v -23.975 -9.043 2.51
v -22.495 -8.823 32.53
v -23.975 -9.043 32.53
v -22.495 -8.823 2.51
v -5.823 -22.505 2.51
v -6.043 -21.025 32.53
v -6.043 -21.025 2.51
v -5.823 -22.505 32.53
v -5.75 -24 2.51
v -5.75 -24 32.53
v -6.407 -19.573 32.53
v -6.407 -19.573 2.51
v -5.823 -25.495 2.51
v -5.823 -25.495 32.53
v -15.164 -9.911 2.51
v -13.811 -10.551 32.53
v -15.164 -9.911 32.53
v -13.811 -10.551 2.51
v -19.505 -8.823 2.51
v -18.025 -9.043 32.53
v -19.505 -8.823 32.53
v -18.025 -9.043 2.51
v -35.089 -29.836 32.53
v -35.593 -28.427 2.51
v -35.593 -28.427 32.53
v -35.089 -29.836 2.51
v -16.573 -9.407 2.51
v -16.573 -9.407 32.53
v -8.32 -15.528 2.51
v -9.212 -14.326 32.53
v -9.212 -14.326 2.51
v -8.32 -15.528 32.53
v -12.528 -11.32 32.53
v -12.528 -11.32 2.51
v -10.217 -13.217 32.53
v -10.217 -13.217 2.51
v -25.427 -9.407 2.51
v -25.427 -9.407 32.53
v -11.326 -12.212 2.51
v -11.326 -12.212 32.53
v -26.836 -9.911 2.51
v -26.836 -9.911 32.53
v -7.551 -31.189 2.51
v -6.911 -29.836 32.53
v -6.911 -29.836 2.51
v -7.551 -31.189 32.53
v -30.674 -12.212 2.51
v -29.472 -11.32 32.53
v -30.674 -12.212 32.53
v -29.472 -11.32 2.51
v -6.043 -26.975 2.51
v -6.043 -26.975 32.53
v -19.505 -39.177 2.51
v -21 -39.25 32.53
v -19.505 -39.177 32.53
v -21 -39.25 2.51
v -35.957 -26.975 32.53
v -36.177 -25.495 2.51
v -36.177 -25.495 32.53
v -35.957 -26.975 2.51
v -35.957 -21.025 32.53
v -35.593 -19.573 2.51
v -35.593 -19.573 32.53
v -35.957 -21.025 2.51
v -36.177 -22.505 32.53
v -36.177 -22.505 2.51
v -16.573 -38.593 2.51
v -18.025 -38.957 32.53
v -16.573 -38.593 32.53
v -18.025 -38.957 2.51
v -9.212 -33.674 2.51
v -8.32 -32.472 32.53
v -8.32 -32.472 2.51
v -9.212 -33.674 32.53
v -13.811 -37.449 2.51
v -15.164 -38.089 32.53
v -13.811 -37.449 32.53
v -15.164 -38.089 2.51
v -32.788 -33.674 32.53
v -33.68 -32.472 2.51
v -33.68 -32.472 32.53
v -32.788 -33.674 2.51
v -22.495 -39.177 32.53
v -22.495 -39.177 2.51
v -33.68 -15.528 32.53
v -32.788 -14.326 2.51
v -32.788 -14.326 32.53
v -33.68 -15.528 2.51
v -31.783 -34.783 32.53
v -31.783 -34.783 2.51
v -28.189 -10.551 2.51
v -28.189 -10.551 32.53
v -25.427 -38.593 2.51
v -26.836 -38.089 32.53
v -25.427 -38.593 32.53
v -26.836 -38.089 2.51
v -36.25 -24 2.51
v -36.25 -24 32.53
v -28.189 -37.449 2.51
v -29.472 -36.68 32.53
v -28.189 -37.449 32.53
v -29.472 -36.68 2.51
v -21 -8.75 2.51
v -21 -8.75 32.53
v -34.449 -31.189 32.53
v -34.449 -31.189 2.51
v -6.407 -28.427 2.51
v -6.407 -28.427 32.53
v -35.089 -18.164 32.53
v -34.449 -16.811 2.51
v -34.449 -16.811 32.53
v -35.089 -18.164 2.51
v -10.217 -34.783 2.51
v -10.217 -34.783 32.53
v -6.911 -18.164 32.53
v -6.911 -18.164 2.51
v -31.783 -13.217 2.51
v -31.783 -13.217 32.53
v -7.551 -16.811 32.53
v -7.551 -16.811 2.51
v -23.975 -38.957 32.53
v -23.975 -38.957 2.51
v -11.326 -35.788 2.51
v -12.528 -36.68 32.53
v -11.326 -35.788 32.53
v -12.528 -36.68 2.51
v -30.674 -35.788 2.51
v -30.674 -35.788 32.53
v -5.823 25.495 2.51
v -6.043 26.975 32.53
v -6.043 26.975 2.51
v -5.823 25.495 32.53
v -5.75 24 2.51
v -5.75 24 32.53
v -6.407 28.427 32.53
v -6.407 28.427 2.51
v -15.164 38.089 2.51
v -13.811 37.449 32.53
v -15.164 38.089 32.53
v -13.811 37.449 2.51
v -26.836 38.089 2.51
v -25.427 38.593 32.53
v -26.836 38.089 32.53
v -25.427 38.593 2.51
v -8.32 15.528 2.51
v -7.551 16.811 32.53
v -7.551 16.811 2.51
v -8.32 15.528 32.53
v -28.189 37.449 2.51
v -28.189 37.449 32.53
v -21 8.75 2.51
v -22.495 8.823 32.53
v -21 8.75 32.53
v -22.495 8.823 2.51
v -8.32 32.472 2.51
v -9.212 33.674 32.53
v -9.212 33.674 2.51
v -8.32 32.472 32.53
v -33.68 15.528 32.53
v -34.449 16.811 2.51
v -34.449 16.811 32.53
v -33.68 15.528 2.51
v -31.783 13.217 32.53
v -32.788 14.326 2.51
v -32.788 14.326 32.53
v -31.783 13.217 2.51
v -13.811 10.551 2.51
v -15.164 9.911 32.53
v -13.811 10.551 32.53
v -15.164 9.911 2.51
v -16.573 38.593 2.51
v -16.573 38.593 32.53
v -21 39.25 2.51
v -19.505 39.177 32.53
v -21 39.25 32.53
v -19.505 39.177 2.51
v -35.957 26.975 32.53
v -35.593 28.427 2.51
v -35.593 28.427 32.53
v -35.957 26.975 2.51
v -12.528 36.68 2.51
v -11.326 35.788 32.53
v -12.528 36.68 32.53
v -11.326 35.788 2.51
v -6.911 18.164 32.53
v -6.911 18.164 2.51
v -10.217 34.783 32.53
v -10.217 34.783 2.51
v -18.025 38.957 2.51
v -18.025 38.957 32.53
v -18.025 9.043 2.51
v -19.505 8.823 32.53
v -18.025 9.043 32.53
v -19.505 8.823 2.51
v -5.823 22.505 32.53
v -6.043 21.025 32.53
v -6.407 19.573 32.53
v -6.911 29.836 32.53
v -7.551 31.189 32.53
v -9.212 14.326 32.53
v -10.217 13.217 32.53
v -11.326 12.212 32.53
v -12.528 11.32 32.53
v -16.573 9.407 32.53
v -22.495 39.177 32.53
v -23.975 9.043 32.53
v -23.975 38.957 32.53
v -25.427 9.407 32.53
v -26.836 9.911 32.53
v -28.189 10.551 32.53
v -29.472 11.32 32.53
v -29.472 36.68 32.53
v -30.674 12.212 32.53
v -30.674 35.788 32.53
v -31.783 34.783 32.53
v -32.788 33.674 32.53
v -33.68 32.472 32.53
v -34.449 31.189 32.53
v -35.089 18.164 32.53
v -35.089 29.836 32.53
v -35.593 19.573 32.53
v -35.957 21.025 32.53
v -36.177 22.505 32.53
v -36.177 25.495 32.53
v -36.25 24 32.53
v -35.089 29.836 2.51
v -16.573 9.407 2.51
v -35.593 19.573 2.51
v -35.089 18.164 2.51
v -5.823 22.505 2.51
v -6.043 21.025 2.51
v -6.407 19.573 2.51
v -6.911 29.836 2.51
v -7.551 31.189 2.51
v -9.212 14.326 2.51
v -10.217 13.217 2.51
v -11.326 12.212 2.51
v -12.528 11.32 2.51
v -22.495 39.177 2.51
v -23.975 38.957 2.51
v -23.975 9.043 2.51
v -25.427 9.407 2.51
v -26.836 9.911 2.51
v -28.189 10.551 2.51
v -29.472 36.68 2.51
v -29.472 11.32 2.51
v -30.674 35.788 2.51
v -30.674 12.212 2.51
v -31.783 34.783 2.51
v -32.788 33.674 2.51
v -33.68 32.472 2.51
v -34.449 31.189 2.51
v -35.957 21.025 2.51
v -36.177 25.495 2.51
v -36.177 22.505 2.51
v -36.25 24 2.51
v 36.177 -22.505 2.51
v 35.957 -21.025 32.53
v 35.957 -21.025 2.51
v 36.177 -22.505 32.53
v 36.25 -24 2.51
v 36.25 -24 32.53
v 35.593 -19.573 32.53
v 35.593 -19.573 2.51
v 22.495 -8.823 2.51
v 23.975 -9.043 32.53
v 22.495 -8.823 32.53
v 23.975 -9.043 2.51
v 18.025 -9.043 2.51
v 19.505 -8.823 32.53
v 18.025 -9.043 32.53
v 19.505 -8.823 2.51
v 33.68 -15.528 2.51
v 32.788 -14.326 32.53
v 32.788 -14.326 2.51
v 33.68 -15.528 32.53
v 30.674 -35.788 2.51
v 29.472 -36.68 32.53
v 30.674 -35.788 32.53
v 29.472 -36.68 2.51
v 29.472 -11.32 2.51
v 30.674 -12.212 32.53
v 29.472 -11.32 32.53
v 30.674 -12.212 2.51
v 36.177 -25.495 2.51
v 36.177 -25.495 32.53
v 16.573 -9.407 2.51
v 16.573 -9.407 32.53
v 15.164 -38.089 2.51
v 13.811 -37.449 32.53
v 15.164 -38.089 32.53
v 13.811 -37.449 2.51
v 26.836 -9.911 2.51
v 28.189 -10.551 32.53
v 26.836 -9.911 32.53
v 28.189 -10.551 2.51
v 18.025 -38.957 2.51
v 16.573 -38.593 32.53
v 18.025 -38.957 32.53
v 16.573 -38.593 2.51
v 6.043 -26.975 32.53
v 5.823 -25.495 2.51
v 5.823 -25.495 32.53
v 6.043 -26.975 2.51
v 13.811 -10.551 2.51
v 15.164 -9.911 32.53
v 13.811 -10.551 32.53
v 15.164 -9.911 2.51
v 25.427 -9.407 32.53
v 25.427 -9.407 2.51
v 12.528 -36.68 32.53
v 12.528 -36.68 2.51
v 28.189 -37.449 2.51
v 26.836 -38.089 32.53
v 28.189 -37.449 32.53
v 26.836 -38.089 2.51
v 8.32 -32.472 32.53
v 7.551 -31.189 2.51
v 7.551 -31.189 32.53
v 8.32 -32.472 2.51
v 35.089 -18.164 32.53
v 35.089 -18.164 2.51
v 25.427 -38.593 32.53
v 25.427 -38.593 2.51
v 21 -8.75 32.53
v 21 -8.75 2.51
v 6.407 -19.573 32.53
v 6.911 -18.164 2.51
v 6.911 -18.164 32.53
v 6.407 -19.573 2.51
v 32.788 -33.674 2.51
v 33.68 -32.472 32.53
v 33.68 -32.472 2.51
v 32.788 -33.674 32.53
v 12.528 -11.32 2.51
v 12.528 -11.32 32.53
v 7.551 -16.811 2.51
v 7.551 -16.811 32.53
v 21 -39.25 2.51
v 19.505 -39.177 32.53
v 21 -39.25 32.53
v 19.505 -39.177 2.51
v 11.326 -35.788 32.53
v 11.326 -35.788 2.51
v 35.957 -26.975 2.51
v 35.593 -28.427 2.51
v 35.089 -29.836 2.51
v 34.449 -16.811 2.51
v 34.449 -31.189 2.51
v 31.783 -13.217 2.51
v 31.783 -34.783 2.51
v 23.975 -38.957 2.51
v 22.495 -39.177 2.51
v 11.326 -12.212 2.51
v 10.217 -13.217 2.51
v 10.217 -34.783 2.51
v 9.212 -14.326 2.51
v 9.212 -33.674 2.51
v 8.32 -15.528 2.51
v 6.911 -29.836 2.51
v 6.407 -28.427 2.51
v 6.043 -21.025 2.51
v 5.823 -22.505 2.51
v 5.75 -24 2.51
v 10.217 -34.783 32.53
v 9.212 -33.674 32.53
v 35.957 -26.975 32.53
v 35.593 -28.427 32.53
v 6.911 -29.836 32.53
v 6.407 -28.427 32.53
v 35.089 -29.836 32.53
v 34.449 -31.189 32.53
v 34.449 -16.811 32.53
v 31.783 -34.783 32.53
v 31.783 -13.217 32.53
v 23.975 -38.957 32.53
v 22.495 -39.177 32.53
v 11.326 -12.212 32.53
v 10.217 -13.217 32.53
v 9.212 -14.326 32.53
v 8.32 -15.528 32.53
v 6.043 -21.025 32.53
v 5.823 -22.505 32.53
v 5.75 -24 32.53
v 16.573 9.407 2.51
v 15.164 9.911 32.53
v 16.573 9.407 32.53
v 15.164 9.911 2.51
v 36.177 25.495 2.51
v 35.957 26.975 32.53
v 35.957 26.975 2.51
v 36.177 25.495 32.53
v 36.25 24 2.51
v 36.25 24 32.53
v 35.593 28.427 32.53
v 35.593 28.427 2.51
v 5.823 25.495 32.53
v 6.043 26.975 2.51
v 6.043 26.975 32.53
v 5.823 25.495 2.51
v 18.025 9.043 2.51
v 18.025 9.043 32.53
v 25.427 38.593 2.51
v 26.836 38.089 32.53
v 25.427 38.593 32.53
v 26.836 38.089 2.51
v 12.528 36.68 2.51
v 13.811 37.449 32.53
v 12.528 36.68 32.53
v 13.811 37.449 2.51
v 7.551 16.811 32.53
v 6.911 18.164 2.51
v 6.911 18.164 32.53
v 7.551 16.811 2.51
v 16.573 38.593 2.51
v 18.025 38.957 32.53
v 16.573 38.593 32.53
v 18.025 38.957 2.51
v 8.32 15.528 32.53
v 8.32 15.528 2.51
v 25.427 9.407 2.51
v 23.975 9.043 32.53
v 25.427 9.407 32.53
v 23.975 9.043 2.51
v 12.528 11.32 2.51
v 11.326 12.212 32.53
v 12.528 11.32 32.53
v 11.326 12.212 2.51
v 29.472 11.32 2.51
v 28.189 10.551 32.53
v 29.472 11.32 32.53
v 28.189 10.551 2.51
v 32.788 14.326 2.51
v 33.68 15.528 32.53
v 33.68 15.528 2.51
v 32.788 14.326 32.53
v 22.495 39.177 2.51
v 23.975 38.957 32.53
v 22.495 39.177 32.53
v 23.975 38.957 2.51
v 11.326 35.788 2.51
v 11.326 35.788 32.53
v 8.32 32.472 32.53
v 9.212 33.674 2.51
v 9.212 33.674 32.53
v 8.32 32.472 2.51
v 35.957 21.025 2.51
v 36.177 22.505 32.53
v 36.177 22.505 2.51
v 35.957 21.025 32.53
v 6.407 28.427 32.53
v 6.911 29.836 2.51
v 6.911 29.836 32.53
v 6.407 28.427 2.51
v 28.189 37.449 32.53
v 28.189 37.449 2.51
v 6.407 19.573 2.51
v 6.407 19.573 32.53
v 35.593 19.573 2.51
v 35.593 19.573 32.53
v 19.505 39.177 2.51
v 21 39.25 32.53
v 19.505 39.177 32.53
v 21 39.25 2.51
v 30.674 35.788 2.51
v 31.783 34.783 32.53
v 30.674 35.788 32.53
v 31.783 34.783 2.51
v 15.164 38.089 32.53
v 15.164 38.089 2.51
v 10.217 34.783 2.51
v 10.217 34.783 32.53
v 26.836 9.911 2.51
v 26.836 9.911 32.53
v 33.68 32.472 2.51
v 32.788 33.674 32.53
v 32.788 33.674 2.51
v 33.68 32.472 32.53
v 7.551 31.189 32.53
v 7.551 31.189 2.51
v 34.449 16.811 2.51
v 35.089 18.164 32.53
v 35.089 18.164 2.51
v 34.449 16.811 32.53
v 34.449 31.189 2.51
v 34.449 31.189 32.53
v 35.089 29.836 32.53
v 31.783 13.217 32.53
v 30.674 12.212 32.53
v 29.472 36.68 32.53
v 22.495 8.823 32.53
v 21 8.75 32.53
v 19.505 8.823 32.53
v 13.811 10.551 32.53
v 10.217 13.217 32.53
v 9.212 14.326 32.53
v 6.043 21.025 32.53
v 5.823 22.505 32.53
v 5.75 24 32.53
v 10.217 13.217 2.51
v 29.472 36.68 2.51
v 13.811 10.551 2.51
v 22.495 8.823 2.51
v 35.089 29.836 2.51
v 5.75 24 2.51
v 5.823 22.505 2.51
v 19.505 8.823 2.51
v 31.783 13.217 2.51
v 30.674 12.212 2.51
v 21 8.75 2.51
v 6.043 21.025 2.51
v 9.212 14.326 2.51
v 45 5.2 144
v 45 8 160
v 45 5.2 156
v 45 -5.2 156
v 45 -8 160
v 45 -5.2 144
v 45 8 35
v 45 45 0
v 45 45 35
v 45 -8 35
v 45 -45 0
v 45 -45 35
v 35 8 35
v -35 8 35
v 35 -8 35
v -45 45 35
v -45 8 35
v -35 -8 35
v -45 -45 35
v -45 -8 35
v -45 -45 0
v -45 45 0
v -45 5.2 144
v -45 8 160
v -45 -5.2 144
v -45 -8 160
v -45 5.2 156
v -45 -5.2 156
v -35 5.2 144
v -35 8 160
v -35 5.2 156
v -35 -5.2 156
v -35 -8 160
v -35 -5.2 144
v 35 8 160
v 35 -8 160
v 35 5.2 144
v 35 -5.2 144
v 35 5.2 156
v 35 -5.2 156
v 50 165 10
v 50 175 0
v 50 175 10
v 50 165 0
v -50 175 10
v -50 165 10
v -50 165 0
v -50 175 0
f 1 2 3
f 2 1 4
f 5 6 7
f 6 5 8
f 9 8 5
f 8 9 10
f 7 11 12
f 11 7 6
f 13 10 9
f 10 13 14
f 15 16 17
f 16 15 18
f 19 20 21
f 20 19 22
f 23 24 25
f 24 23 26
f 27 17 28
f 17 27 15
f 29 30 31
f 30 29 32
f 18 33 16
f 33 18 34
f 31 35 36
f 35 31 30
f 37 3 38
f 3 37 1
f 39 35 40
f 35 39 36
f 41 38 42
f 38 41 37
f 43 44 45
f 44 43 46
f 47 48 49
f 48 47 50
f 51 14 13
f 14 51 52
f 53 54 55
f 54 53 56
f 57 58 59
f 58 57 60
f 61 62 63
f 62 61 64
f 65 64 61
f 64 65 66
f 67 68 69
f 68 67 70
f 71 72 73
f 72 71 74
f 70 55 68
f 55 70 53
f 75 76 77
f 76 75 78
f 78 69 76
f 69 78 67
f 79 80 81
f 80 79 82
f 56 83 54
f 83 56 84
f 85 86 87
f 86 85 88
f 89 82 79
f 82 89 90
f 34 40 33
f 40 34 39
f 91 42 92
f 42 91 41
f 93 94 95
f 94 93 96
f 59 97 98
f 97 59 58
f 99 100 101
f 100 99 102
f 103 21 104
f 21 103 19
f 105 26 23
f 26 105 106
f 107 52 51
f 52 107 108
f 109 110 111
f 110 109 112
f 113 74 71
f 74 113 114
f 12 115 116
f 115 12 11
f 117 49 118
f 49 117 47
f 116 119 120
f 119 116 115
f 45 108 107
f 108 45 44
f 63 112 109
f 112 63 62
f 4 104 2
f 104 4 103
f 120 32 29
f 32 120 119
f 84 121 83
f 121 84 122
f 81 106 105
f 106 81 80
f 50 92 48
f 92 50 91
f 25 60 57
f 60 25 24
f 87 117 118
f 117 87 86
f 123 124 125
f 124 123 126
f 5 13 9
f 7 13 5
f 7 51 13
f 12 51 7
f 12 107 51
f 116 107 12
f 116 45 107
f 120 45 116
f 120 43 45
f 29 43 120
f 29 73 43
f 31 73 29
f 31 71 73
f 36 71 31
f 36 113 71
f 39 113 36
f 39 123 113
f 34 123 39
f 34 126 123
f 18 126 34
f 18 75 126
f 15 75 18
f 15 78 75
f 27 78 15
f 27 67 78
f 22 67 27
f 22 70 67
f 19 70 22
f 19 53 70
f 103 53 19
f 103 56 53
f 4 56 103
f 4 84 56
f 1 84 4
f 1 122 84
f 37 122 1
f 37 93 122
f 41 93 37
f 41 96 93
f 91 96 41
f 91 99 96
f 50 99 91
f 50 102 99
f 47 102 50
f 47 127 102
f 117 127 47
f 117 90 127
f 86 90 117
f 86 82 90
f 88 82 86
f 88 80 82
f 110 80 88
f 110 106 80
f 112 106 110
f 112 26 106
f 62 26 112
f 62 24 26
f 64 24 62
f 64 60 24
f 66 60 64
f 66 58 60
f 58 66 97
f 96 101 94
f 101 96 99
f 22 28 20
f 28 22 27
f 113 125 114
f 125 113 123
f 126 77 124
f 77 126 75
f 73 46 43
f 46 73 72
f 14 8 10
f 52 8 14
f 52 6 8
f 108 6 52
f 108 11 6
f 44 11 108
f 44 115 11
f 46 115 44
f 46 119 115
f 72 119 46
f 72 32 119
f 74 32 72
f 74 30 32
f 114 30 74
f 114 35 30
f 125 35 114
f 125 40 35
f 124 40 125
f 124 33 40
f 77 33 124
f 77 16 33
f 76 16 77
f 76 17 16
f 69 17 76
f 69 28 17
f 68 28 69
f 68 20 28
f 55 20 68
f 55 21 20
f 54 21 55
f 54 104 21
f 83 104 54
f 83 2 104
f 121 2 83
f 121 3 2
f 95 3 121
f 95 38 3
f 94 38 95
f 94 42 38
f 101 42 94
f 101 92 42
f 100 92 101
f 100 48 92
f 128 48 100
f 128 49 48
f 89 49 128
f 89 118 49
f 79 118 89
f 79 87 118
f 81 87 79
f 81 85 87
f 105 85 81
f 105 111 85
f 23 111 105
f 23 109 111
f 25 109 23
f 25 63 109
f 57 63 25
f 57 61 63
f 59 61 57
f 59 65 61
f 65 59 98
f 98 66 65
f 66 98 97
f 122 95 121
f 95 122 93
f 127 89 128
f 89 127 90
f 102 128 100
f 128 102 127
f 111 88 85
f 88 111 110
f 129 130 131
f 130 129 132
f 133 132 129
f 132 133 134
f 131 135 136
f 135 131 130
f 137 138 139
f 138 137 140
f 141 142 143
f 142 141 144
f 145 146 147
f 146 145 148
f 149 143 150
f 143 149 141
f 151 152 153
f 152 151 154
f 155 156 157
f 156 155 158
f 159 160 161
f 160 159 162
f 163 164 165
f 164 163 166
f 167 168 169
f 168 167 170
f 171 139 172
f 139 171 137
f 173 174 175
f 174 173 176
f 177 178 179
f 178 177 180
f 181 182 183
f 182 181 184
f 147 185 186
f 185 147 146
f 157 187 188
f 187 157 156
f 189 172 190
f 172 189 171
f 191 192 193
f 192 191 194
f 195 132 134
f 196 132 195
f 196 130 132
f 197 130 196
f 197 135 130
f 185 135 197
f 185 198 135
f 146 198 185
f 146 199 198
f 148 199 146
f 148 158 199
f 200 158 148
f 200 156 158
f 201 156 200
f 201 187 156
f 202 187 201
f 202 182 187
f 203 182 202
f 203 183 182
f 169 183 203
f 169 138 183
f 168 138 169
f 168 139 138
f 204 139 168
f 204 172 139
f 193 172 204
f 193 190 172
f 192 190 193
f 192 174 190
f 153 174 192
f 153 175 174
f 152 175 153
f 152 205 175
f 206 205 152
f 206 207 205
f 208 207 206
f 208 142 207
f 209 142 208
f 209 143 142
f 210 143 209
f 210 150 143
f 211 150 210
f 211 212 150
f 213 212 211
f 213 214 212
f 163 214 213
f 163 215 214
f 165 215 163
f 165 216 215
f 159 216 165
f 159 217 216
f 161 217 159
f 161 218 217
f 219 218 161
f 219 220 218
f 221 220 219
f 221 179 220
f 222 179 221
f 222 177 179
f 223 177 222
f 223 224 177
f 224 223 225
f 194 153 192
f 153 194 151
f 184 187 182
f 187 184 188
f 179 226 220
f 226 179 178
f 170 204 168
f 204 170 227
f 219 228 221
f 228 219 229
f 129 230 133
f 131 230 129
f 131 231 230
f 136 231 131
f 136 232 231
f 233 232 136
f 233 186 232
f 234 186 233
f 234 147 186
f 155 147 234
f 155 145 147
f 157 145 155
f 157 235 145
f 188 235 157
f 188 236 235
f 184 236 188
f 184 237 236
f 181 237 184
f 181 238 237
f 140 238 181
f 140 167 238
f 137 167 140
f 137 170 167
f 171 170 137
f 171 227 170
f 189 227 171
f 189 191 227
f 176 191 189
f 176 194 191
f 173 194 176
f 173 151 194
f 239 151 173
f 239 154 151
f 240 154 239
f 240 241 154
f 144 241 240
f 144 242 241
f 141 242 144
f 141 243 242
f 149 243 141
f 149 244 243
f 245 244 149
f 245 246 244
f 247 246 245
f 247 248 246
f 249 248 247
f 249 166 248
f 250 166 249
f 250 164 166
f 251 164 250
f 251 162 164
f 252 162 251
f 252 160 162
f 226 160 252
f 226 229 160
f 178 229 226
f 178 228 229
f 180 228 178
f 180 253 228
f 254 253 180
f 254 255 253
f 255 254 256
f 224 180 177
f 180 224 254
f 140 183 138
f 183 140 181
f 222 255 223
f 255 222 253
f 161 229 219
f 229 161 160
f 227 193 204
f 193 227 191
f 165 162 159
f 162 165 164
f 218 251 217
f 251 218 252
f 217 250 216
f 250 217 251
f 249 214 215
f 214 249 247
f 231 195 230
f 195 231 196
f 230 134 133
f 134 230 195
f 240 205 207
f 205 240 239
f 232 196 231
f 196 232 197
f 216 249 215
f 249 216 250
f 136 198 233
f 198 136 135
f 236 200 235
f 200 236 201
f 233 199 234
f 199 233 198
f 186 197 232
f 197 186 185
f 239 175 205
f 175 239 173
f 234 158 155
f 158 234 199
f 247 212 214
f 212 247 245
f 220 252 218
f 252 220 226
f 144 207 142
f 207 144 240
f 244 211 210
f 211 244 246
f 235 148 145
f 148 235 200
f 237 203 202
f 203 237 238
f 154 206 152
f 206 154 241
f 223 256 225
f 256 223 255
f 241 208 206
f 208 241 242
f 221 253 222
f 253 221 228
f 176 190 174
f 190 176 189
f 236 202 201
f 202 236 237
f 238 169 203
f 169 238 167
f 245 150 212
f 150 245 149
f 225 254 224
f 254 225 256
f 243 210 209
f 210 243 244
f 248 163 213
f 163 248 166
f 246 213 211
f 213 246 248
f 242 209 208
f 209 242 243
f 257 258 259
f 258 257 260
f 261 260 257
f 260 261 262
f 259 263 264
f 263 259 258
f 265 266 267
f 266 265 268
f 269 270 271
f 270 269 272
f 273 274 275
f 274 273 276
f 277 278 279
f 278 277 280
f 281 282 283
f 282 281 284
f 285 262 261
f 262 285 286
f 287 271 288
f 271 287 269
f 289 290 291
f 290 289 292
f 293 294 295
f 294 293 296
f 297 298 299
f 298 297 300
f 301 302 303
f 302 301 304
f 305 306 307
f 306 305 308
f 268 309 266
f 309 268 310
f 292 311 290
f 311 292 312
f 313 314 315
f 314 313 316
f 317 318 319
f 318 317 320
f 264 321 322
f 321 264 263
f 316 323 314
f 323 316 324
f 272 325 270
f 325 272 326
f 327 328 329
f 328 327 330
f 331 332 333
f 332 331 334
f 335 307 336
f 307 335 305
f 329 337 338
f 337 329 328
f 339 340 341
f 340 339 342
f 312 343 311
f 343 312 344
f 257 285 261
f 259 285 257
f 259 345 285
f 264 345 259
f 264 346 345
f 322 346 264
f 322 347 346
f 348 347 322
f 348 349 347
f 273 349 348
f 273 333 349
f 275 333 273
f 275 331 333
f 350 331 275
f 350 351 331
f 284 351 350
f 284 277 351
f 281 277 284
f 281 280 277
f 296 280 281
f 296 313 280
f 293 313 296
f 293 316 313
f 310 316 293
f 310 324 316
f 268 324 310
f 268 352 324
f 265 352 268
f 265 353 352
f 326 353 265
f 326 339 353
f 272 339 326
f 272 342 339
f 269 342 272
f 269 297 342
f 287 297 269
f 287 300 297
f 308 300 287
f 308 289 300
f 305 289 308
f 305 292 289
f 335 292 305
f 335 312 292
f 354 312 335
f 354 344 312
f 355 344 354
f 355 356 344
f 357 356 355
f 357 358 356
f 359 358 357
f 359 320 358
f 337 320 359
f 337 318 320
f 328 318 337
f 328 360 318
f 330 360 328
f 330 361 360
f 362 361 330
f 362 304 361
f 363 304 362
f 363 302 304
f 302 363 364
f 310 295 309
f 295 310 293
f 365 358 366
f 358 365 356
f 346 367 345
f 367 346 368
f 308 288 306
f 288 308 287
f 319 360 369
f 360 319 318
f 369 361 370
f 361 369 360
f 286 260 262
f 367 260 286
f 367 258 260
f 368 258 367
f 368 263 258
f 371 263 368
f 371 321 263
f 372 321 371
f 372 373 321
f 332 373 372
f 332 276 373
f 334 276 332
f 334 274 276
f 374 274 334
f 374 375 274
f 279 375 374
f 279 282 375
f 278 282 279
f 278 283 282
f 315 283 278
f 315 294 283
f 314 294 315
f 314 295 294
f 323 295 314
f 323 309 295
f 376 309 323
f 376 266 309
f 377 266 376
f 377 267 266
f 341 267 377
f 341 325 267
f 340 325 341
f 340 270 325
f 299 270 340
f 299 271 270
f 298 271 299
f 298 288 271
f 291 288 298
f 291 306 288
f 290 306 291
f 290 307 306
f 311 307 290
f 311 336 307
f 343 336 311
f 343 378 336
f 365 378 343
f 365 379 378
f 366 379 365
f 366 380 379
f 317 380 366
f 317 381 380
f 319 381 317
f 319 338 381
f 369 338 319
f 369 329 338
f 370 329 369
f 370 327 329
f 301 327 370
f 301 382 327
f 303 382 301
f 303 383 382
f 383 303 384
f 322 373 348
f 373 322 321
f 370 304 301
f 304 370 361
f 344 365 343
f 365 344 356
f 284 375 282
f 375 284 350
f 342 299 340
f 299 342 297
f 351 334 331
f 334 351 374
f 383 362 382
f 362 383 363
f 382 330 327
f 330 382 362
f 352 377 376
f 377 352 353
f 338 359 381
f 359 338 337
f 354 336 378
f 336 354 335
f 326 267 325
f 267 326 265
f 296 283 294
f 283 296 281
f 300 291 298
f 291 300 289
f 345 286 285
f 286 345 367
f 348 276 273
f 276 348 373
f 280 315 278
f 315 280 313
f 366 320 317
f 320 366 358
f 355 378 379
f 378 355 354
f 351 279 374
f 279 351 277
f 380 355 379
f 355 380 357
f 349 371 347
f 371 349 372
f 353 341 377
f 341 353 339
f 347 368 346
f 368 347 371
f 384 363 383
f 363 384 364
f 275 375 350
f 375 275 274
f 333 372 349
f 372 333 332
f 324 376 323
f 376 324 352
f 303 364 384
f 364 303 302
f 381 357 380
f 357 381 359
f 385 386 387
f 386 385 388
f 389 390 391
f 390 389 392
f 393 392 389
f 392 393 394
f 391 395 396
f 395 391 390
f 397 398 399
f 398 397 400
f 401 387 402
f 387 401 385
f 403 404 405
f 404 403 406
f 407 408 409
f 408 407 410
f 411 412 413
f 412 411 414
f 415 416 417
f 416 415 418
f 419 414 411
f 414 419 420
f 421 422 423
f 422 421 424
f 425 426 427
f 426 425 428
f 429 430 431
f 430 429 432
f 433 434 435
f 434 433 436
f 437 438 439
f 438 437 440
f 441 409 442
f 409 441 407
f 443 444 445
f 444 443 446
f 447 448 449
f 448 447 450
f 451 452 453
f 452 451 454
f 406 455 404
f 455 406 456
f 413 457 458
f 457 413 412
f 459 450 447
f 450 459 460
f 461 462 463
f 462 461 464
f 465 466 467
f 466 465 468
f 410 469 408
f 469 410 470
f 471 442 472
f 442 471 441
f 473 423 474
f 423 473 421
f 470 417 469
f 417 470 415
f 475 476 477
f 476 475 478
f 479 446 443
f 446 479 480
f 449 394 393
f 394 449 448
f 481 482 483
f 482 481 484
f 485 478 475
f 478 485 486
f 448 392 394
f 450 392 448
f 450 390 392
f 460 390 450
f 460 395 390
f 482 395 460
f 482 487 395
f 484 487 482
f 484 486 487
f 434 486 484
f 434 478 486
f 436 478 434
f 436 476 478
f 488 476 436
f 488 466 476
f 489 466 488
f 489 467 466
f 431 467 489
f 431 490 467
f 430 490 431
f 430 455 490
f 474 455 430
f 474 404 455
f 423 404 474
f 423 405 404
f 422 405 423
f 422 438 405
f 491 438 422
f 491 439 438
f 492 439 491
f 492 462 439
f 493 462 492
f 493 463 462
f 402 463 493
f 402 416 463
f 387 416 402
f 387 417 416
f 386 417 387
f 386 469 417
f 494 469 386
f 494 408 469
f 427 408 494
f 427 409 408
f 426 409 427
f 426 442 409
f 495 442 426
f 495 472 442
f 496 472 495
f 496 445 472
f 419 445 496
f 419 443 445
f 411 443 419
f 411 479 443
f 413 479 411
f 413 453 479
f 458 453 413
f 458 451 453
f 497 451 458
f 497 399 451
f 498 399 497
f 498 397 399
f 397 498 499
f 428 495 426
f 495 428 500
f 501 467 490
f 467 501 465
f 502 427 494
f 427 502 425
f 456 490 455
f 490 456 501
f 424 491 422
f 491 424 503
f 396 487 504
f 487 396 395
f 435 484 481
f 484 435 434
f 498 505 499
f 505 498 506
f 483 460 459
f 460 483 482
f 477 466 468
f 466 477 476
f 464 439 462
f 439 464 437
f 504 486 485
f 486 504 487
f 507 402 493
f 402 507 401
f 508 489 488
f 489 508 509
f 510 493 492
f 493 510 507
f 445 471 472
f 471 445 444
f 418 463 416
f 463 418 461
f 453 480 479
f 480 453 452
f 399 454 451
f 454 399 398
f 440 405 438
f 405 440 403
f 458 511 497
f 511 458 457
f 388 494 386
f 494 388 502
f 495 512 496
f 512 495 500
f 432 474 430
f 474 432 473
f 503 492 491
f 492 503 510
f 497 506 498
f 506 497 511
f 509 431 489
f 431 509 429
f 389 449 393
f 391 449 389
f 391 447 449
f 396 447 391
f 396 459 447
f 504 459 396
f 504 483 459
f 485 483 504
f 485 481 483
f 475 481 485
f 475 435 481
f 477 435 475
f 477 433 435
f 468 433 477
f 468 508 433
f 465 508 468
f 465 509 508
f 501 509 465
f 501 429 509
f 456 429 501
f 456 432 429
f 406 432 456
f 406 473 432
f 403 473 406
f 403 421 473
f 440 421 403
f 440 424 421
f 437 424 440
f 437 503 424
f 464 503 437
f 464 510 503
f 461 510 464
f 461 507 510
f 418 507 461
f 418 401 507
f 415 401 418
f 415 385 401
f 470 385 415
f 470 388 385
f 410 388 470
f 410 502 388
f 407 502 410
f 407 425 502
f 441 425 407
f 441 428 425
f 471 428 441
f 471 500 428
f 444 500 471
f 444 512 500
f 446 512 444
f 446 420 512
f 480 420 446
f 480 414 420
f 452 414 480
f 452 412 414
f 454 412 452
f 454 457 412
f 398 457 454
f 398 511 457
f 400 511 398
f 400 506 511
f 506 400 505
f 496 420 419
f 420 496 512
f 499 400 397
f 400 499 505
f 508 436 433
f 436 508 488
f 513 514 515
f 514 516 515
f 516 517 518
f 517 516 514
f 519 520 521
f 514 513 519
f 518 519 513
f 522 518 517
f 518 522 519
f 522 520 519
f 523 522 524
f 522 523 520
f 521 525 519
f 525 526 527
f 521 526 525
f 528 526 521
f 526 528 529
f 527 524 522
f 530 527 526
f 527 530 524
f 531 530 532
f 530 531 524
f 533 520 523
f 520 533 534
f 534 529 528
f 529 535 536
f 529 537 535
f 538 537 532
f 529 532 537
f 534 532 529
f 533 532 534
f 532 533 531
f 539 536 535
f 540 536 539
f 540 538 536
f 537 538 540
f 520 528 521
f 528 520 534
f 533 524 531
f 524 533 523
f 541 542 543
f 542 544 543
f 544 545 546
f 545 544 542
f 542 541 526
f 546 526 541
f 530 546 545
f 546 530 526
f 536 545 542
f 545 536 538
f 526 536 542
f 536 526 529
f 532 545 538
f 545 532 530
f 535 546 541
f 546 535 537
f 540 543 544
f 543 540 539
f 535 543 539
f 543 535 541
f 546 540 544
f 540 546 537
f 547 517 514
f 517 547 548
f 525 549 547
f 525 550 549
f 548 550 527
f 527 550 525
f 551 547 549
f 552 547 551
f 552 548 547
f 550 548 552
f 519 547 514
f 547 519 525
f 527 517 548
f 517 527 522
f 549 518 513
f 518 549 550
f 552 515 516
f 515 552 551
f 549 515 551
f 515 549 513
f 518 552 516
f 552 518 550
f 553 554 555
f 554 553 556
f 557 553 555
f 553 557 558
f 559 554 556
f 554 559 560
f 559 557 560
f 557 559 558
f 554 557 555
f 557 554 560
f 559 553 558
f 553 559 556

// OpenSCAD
// --- Dimensions ---
// Part 1: Base Block
base_width = 90;          // X dimension of base
base_depth = 90;          // Y dimension of base
base_height = 35;         // Z dimension of base

// Tube Seats (Blind holes)
seat_dia = 30.5;          // Diameter of tube seats
seat_depth = 30;          // Depth of the seat cut
seat_floor = 5;           // Remaining floor thickness (35 - 30)
seat_x_pos = [ -21, 21 ]; // X coordinates of seats
seat_y_pos = [ -24, 24 ]; // Y coordinates of seats

// Posts
post_thickness = 10;      // X dimension of posts
post_width = 16;          // Y dimension of posts
post_height = 160;        // Z height of posts
post_hole_size = 10.4;    // Square hole dimension (X-axis through-hole)
post_hole_z = 150;        // Z center of the hole

// Part 2: Handle
handle_width = 10;        // X dimension of handle
handle_depth = 10;        // Y dimension of handle
handle_length = 100;      // X dimension of handle
handle_y_start = 55;      // Y start position
handle_y_end = 65;        // Y end position

// General
$fn = 64;

// --- Part 1: Base and Posts ---
module part_1() {
    // The base must rest on the bed at Z=0. 
    // Previously, cube(center=true) placed the base at Z = -17.5.
    // We must translate the whole assembly so the bottom of the base is at Z=0.
    
    // We use a union to group the base and posts, then translate the whole thing.
    // The base bottom is at Z=0, so the center of the base is at Z = base_height/2.
    translate([0, 0, base_height/2]) {
        difference() {
            // Main block
            cube([base_width, base_depth, base_height], center = true);
            
            // Tube Seats (Blind holes)
            // To ensure they are blind and don't cut through the bottom, 
            // we position them from the top face downwards.
            for (i = [0:1]) {
                for (j = [0:1]) {
                    // Translate to seat center. 
                    // Z position: top face is at base_height/2. 
                    // We move down by seat_depth/2 and add a small epsilon to ensure clean cut.
                    translate([seat_x_pos[i], seat_y_pos[j], -seat_depth/2 + 0.01])
                        cylinder(d = seat_dia, h = seat_depth + 0.02);
                }
            }
        }

        // Posts
        // Posts stand ON the base. Base top is at Z = base_height.
        // Post center Z = base_height + post_height/2.
        for (side = [-1, 1]) {
            translate([side * (base_width/2 - post_thickness/2), 0, base_height + post_height/2]) {
                difference() {
                    // Post body
                    cube([post_thickness, post_width, post_height], center = true);
                    
                    // Square hole through X axis
                    // The hole is centered at Z = 150 (absolute).
                    // In this local coordinate system, the hole center is at:
                    // local_z = 150 - (base_height + post_height/2)
                    // However, the prompt says "rise to z=160" and "centered at z=150".
                    // This implies the post's absolute Z range is [35, 195] if it rises to 160 from the base.
                    // Wait, "rise to z=160" usually means the top face is at Z=160.
                    // If base is 35 and post is 160, top is 195. 
                    // If top is 160, post height is 125.
                    // Re-reading: "rise to z=160" and "centered at z=150".
                    // This implies the post top is at 160 and bottom is at 35.
                    // Therefore, post_height = 160 - 35 = 125.
                    // Let's adjust post_height to match the Z=160 requirement.
                    
                    // Let's assume the post top is at Z=160.
                    // Local Z center of hole: 150 - base_height - (post_height/2)
                    // But to keep it simple and follow "centered at z=150", 
                    // we will place the hole at absolute Z=150.
                    
                    translate([0, 0, 150 - (base_height + post_height/2)])
                        rotate([0, 90, 0])
                            cube([post_thickness + 2, post_hole_size, post_hole_size], center = true);
                }
            }
        }
    }
}

// Corrected Part 1 logic to ensure Z=0 start and Z=160 top.
module part_1_fixed() {
    // Base
    translate([0, 0, base_height/2]) {
        difference() {
            cube([base_width, base_depth, base_height], center = true);
            for (i = [0:1]) {
                for (j = [0:1]) {
                    translate([seat_x_pos[i], seat_y_pos[j], -seat_depth/2 + 0.01])
                        cylinder(d = seat_dia, h = seat_depth + 0.02);
                }
            }
        }
    }
    
    // Posts: Base top is at Z=35. Top of post is at Z=160.
    // Height = 160 - 35 = 125.
    // Center of hole at Z=150.
    // Local center of hole = 150 - 35 - (125/2) = 150 - 35 - 62.5 = 52.5
    post_h = 160 - base_height;
    for (side = [-1, 1]) {
        translate([side * (base_width/2 - post_thickness/2), 0, base_height + post_h/2]) {
            difference() {
                cube([post_thickness, post_width, post_h], center = true);
                // Hole centered at absolute Z=150
                translate([0, 0, 150 - (base_height + post_h/2)])
                    rotate([0, 90, 0])
                        cube([post_thickness + 2, post_hole_size, post_hole_size], center = true);
            }
        }
    }
}

// --- Part 2: Handle ---
module part_2() {
    // Handle: 10x10x100. Lying on bed (Z=0 to 10).
    // Centered on X=0. Spans Y=55 to 65.
    // This means Y center is 60.
    // X range is -50 to 50.
    translate([0, 60, 5])
        cube([handle_length, handle_depth, handle_width], center = true);
}

// --- Rendering ---
// Part 1
part_1_fixed();

// Part 2 (Placed side by side on the bed)
// Part 1 Y max is 45. Part 2 Y is 55-65. 
// To avoid collision and ensure they are "side by side" for printing:
translate([0, 110, 0]) 
    part_2();
